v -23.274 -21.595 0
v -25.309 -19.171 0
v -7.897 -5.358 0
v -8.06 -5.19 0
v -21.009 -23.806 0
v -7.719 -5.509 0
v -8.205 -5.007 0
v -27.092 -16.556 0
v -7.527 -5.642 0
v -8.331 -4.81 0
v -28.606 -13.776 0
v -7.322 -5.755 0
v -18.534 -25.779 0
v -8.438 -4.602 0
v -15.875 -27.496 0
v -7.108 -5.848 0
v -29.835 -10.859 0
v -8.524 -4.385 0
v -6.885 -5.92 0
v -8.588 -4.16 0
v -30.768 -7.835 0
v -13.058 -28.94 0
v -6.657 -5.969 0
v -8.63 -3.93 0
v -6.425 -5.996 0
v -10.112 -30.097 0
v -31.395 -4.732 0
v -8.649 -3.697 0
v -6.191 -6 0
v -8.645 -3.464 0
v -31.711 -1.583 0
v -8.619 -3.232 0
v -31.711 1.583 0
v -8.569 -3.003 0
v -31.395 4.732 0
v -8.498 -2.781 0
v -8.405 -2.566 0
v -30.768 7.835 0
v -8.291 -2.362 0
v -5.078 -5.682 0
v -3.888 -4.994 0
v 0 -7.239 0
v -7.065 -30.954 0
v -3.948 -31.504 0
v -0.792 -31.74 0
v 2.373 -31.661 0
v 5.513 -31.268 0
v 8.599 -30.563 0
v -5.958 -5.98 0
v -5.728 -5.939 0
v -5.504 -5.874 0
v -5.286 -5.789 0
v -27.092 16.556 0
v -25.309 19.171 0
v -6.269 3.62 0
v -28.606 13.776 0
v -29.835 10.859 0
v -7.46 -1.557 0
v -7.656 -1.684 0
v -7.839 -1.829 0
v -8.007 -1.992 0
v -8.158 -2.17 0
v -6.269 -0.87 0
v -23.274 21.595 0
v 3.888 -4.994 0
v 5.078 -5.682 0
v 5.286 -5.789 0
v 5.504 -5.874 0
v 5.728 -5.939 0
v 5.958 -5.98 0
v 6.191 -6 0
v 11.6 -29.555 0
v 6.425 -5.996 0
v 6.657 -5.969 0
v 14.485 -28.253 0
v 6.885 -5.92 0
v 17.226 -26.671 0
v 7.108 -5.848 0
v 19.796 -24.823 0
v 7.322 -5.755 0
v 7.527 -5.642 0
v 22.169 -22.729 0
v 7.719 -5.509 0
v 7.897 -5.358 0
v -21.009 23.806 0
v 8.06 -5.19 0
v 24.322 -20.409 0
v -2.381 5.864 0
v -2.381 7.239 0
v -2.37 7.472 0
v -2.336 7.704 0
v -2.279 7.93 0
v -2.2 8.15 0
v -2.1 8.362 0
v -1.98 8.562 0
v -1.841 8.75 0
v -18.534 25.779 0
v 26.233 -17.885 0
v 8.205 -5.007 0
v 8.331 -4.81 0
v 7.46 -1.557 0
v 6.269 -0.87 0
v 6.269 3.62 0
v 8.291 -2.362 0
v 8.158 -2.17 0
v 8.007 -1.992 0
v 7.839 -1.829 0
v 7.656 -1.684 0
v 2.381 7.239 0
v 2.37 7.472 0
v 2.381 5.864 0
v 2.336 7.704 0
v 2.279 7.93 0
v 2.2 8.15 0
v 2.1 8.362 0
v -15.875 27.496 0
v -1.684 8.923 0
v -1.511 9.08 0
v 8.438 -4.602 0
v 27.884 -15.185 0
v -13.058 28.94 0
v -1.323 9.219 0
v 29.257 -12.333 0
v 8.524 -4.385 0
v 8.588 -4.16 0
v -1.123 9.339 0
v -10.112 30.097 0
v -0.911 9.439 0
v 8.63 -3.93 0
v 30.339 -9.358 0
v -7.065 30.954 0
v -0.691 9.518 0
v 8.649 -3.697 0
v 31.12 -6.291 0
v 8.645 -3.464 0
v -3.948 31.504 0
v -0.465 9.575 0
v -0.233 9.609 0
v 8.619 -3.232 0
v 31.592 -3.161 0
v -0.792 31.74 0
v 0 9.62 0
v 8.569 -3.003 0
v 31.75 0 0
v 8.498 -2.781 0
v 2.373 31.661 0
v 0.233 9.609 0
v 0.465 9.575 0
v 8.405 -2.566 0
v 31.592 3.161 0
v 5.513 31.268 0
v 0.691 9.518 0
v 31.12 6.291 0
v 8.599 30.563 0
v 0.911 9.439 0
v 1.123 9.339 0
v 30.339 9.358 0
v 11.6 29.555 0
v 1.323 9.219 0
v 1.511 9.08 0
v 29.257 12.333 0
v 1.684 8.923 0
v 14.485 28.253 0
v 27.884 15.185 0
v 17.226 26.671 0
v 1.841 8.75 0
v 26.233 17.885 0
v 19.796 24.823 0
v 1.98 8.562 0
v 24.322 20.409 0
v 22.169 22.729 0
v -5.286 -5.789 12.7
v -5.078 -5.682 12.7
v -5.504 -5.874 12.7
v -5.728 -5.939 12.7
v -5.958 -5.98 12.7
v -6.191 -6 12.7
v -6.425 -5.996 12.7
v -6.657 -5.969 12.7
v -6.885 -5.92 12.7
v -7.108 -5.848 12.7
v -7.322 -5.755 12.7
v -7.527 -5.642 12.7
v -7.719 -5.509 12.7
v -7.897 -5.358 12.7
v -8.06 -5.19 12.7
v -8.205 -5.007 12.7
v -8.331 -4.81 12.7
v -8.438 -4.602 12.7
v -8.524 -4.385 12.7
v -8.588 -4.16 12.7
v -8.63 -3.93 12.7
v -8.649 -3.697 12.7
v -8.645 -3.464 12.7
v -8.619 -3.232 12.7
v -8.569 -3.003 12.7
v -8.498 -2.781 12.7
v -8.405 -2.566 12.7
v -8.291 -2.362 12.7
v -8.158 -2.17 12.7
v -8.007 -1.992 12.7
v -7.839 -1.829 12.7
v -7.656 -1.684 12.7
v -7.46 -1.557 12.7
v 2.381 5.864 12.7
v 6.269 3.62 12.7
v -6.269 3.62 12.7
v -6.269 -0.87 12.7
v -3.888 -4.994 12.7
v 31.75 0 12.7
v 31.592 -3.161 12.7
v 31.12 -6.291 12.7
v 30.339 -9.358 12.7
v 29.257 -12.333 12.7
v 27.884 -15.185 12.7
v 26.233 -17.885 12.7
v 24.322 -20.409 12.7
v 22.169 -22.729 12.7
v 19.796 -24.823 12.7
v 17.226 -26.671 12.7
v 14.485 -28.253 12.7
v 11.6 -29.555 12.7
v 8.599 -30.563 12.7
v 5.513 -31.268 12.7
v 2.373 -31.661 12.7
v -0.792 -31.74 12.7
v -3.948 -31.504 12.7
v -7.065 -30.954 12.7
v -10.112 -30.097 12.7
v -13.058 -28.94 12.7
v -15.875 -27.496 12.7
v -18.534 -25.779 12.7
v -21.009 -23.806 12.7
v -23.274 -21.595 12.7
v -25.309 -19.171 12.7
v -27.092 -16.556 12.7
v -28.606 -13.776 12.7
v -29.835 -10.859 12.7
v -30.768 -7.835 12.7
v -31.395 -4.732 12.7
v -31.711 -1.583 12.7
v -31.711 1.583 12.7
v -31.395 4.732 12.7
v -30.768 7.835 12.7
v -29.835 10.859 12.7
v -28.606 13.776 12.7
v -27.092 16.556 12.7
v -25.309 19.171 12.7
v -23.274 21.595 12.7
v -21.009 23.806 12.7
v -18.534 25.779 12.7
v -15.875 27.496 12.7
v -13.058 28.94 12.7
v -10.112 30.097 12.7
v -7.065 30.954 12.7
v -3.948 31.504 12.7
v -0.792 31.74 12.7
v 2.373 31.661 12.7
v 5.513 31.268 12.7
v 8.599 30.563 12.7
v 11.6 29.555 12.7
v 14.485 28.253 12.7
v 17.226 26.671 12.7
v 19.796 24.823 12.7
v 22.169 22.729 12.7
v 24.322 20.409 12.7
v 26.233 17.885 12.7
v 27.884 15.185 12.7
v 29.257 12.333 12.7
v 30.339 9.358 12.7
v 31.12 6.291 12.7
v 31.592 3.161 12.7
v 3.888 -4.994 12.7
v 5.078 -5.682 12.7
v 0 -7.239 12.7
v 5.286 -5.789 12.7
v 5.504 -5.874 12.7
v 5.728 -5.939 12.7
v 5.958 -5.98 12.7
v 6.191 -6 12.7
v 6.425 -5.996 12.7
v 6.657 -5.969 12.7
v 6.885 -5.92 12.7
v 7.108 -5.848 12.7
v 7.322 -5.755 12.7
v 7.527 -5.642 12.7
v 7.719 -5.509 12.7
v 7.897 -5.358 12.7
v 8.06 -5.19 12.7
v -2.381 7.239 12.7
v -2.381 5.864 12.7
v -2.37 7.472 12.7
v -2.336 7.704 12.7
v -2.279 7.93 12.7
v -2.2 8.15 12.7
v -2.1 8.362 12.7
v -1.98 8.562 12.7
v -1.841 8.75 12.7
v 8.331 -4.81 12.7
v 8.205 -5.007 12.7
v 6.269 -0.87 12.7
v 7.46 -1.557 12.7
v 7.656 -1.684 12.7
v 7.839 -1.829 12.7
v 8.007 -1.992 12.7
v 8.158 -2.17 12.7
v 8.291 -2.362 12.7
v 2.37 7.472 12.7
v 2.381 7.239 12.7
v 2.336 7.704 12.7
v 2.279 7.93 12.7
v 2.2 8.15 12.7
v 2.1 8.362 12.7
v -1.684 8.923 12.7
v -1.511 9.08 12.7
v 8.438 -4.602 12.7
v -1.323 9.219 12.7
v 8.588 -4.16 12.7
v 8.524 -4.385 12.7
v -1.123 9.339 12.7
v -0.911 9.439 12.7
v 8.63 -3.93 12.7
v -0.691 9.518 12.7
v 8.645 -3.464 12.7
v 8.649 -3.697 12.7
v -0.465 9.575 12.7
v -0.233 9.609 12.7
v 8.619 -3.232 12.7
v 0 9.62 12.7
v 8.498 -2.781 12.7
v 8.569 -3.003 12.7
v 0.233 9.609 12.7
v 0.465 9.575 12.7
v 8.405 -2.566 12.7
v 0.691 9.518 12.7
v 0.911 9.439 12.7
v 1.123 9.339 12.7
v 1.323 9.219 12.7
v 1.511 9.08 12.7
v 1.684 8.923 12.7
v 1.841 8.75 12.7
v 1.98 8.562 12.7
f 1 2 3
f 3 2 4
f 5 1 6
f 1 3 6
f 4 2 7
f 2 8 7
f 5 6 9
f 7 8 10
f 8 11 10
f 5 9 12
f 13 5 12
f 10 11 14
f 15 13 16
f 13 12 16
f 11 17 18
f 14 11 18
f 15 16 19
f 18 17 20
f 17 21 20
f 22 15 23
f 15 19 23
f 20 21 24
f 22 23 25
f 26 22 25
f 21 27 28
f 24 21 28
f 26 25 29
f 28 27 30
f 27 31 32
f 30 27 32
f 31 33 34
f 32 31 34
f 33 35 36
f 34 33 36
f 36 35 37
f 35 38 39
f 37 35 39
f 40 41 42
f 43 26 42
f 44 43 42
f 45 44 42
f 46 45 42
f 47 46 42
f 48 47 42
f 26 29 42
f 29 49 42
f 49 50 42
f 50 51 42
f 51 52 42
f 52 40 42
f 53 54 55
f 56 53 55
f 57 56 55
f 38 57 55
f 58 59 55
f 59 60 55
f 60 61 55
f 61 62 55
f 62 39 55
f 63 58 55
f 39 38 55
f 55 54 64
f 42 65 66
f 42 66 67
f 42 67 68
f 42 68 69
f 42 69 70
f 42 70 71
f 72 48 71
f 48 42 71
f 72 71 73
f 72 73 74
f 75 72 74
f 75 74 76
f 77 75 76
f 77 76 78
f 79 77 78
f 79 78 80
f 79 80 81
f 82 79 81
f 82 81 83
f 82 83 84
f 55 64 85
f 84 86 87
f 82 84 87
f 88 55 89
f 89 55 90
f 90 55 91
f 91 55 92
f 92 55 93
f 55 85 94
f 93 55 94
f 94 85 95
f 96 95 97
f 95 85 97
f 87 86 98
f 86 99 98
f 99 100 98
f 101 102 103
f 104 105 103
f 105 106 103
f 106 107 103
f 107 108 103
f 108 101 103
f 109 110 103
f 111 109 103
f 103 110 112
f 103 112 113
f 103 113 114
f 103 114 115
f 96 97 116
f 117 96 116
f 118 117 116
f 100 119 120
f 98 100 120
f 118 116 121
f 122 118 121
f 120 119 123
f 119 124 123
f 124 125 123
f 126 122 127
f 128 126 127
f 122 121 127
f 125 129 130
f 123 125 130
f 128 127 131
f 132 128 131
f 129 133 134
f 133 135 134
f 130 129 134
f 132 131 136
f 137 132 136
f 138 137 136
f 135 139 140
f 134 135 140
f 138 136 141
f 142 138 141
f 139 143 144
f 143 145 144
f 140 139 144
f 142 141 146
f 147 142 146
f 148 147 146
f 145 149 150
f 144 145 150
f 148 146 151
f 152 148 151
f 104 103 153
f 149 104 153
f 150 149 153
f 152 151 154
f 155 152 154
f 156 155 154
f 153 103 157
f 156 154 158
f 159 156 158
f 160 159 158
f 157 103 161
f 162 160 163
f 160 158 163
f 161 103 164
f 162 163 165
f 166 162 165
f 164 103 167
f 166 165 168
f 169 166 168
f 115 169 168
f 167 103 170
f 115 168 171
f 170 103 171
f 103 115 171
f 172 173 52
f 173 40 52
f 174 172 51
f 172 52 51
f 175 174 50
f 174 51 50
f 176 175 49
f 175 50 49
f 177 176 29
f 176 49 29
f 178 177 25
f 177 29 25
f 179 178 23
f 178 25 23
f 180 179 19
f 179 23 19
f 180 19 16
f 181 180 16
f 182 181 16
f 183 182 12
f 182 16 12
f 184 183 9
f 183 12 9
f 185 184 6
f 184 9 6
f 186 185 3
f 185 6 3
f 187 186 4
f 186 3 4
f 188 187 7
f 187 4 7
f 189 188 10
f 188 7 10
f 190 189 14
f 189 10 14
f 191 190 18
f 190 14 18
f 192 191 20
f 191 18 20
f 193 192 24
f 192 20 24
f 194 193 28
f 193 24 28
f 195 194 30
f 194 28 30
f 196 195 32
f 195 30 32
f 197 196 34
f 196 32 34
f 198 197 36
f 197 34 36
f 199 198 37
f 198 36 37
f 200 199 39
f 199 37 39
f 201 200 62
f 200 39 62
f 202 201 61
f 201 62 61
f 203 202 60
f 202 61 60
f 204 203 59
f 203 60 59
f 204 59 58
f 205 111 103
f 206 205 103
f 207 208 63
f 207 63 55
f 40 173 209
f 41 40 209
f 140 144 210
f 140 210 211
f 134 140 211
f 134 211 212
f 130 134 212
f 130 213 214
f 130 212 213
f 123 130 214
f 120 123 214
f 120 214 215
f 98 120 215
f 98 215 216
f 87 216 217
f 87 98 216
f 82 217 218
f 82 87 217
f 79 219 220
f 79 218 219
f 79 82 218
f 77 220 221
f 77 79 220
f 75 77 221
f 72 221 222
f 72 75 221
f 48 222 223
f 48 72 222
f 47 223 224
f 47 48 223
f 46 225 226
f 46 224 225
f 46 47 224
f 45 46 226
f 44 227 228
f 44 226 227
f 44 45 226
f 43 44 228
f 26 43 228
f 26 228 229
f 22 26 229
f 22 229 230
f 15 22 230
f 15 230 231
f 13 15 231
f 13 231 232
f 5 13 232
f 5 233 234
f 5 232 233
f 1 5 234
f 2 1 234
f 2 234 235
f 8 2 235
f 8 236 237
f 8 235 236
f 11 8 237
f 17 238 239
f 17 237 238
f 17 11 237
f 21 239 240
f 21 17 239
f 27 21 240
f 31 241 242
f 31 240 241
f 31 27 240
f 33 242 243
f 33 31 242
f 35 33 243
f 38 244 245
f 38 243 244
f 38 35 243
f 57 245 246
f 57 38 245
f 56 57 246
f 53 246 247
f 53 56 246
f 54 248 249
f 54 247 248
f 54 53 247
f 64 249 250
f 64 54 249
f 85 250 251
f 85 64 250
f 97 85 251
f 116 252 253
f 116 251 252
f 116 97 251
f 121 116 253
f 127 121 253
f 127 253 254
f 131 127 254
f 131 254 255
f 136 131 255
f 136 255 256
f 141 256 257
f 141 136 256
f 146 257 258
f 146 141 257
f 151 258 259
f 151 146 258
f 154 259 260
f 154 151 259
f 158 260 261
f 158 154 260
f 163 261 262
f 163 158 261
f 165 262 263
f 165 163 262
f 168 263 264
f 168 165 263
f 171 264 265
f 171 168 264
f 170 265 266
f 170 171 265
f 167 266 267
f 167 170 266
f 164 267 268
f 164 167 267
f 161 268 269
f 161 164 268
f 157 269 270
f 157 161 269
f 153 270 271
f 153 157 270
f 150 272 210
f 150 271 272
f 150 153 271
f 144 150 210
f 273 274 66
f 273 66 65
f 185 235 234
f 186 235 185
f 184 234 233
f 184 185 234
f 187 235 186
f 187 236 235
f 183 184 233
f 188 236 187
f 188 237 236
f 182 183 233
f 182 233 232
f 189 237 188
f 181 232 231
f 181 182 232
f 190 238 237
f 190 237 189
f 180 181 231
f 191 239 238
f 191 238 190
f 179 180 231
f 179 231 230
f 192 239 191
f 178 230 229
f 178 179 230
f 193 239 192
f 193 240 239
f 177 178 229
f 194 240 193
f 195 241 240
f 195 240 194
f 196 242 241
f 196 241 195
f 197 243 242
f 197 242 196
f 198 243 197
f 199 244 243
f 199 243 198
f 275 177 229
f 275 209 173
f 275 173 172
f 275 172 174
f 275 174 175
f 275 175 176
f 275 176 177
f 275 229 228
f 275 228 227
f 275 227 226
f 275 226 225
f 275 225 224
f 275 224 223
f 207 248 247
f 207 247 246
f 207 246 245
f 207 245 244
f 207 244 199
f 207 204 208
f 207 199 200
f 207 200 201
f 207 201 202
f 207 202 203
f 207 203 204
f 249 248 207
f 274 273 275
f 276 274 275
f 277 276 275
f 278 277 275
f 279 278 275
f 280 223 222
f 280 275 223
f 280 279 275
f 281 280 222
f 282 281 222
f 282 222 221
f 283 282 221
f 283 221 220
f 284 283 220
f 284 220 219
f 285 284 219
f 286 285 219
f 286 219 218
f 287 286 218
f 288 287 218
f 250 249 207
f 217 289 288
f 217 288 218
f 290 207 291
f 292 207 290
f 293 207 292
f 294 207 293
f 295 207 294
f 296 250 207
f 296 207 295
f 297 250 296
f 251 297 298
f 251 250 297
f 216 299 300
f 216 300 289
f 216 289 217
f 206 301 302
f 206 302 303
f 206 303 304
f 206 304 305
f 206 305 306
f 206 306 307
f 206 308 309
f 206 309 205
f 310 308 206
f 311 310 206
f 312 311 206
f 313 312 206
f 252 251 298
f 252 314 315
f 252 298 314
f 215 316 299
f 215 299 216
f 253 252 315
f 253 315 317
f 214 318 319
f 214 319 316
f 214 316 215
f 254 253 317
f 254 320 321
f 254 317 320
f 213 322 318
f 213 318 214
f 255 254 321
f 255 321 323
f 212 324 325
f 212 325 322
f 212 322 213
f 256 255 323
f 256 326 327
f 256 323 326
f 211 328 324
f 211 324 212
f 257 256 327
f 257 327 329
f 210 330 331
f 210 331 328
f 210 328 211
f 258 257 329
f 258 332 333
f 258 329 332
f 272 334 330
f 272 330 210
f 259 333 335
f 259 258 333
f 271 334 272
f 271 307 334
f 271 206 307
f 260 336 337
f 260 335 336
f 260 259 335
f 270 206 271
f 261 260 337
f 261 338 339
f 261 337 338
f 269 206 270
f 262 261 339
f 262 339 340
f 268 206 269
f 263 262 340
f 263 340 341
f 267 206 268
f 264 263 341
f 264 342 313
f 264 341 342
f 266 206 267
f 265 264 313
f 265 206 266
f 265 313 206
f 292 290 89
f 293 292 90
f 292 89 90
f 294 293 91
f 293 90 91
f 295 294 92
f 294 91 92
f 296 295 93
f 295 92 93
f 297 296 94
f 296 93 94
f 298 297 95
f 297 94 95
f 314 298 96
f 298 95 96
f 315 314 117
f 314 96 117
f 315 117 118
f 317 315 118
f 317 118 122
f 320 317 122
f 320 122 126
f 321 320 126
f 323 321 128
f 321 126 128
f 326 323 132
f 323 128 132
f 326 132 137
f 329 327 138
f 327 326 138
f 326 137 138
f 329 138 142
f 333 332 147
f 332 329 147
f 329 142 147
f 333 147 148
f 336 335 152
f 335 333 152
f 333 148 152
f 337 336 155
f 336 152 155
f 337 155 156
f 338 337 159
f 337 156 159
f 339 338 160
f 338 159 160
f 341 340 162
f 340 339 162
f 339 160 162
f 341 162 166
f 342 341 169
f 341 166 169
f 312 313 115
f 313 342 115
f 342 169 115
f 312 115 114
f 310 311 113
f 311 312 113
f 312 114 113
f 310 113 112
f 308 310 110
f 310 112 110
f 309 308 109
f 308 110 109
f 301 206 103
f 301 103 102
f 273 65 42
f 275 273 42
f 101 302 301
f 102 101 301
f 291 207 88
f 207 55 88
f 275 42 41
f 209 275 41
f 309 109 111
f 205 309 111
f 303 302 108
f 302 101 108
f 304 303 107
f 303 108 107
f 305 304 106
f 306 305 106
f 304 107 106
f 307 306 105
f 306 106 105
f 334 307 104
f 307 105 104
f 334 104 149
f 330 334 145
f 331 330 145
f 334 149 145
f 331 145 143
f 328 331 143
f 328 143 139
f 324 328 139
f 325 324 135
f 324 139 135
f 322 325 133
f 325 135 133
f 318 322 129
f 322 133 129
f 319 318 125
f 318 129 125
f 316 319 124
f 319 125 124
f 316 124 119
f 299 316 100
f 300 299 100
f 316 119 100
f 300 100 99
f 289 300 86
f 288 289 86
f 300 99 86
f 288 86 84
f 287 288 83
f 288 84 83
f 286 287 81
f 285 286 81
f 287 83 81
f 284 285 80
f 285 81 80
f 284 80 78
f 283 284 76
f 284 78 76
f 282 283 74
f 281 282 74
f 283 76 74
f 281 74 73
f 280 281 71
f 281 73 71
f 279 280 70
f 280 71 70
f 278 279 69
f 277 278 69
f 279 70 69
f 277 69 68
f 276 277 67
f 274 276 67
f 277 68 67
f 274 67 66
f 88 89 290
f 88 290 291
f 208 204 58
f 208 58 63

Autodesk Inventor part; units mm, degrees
ref_plane "YZ Plane" through (0, 0, 0) normal (1, 0, 0) x (0, 1, 0)
ref_plane "XZ Plane" through (0, 0, 0) normal (0, 1, 0) x (-1, 0, 0)
ref_plane "XY Plane" through (0, 0, 0) normal (0, 0, 1) x (1, 0, 0)
sketch "Sketch1" plane through (0, 0, 0) normal (0, 0, 1) x (1, 0, 0)
  line L0 (0, 0) -> (0, 7.239) construction
  line L1 (0, 0) -> (6.2692, 3.6195) construction
  line L2 (0, 0) -> (6.2692, -3.6195) construction
  line L3 (0, 0) -> (0, -7.239) construction
  line L4 (0, 0) -> (-6.2692, -3.6195) construction
  line L5 (0, 0) -> (-6.2692, 3.6195) construction
  line L6 (0, 7.239) -> (6.2692, 3.6195)
  line L7 (6.2692, 3.6195) -> (6.2692, -3.6195)
  line L8 (6.2692, -3.6195) -> (0, -7.239)
  line L9 (0, -7.239) -> (-6.2692, -3.6195)
  line L10 (-6.2692, -3.6195) -> (-6.2692, 3.6195)
  line L11 (-6.2692, 3.6195) -> (0, 7.239)
  circle A0 centre (0, 7.239) radius 2.3813
  circle A1 centre (6.2692, -3.6195) radius 2.3813
  circle A2 centre (-6.2692, -3.6195) radius 2.3813
  circle A3 centre (0, 0) radius 31.75
  line L12 (-2.3813, 7.239) -> (-2.3813, 5.8642)
  line L13 (2.3813, 7.239) -> (2.3812, 5.8642)
  line L14 (-2.3813, 7.239) -> (2.3813, 7.239)
  line L15 (-2.3813, 5.8642) -> (2.3812, 5.8642)
  line L16 (7.4598, -1.5573) -> (6.2692, -0.8699)
  line L17 (5.0785, -5.6817) -> (3.8879, -4.9943)
  line L18 (6.2692, -0.8699) -> (3.8879, -4.9943)
  line L19 (7.4598, -1.5573) -> (5.0785, -5.6817)
  line L20 (-7.4598, -1.5573) -> (-6.2692, -0.8699)
  line L21 (-5.0785, -5.6817) -> (-3.8879, -4.9943)
  line L22 (-7.4598, -1.5573) -> (-5.0785, -5.6817)
  line L23 (-3.8879, -4.9943) -> (-6.2692, -0.8699)
  dimension "d0" = 7.239
  dimension "d1" = 60
  dimension "d2" = 60
  dimension "d3" = 4.7625
  dimension "d4" = 4.7625
  dimension "d5" = 4.7625
  dimension "d6" = 63.5
extrude "Extrusion1" add sketch "Sketch1" along normal blind 12.7 contours L6 A0 L13 | L16 A1 L7 | A0 L11 L12 | A1 L17 L8 | L10 A2 L20 | L21 A2 L9 | A3
extrude "Extrusion2" cut sketch "Sketch1" along normal blind 12.7 contours L6 A0 L13 | L6 L7 L18 A1 L8 L9 L23 A2 L10 L11 L15 A0 | L6 L14 A0 | A0 L15 | L7 A1 L18 | L11 A0 L14 | A0 L11 L12 | L7 L8 A1 L18 | L18 A1 | A1 L8 L18 | L23 A2 L10 | A2 L23 L9 L10 | A2 L23 | L9 A2 L23
extrude "Extrusion3" cut sketch "Sketch1" along normal blind 12.7 contours L16 A1 L7 | A1 L19 L7 | A1 L19 | L19 A1 L8 | A1 L17 L8
extrude "Extrusion4" cut sketch "Sketch1" along normal through all contours L10 A2 L20 | L10 L22 A2 | L21 A2 L9 | L9 A2 L22
equation "\"d4\" = d3"
equation "\"d5\" = d3"
properties part number "augmented gear v3"
